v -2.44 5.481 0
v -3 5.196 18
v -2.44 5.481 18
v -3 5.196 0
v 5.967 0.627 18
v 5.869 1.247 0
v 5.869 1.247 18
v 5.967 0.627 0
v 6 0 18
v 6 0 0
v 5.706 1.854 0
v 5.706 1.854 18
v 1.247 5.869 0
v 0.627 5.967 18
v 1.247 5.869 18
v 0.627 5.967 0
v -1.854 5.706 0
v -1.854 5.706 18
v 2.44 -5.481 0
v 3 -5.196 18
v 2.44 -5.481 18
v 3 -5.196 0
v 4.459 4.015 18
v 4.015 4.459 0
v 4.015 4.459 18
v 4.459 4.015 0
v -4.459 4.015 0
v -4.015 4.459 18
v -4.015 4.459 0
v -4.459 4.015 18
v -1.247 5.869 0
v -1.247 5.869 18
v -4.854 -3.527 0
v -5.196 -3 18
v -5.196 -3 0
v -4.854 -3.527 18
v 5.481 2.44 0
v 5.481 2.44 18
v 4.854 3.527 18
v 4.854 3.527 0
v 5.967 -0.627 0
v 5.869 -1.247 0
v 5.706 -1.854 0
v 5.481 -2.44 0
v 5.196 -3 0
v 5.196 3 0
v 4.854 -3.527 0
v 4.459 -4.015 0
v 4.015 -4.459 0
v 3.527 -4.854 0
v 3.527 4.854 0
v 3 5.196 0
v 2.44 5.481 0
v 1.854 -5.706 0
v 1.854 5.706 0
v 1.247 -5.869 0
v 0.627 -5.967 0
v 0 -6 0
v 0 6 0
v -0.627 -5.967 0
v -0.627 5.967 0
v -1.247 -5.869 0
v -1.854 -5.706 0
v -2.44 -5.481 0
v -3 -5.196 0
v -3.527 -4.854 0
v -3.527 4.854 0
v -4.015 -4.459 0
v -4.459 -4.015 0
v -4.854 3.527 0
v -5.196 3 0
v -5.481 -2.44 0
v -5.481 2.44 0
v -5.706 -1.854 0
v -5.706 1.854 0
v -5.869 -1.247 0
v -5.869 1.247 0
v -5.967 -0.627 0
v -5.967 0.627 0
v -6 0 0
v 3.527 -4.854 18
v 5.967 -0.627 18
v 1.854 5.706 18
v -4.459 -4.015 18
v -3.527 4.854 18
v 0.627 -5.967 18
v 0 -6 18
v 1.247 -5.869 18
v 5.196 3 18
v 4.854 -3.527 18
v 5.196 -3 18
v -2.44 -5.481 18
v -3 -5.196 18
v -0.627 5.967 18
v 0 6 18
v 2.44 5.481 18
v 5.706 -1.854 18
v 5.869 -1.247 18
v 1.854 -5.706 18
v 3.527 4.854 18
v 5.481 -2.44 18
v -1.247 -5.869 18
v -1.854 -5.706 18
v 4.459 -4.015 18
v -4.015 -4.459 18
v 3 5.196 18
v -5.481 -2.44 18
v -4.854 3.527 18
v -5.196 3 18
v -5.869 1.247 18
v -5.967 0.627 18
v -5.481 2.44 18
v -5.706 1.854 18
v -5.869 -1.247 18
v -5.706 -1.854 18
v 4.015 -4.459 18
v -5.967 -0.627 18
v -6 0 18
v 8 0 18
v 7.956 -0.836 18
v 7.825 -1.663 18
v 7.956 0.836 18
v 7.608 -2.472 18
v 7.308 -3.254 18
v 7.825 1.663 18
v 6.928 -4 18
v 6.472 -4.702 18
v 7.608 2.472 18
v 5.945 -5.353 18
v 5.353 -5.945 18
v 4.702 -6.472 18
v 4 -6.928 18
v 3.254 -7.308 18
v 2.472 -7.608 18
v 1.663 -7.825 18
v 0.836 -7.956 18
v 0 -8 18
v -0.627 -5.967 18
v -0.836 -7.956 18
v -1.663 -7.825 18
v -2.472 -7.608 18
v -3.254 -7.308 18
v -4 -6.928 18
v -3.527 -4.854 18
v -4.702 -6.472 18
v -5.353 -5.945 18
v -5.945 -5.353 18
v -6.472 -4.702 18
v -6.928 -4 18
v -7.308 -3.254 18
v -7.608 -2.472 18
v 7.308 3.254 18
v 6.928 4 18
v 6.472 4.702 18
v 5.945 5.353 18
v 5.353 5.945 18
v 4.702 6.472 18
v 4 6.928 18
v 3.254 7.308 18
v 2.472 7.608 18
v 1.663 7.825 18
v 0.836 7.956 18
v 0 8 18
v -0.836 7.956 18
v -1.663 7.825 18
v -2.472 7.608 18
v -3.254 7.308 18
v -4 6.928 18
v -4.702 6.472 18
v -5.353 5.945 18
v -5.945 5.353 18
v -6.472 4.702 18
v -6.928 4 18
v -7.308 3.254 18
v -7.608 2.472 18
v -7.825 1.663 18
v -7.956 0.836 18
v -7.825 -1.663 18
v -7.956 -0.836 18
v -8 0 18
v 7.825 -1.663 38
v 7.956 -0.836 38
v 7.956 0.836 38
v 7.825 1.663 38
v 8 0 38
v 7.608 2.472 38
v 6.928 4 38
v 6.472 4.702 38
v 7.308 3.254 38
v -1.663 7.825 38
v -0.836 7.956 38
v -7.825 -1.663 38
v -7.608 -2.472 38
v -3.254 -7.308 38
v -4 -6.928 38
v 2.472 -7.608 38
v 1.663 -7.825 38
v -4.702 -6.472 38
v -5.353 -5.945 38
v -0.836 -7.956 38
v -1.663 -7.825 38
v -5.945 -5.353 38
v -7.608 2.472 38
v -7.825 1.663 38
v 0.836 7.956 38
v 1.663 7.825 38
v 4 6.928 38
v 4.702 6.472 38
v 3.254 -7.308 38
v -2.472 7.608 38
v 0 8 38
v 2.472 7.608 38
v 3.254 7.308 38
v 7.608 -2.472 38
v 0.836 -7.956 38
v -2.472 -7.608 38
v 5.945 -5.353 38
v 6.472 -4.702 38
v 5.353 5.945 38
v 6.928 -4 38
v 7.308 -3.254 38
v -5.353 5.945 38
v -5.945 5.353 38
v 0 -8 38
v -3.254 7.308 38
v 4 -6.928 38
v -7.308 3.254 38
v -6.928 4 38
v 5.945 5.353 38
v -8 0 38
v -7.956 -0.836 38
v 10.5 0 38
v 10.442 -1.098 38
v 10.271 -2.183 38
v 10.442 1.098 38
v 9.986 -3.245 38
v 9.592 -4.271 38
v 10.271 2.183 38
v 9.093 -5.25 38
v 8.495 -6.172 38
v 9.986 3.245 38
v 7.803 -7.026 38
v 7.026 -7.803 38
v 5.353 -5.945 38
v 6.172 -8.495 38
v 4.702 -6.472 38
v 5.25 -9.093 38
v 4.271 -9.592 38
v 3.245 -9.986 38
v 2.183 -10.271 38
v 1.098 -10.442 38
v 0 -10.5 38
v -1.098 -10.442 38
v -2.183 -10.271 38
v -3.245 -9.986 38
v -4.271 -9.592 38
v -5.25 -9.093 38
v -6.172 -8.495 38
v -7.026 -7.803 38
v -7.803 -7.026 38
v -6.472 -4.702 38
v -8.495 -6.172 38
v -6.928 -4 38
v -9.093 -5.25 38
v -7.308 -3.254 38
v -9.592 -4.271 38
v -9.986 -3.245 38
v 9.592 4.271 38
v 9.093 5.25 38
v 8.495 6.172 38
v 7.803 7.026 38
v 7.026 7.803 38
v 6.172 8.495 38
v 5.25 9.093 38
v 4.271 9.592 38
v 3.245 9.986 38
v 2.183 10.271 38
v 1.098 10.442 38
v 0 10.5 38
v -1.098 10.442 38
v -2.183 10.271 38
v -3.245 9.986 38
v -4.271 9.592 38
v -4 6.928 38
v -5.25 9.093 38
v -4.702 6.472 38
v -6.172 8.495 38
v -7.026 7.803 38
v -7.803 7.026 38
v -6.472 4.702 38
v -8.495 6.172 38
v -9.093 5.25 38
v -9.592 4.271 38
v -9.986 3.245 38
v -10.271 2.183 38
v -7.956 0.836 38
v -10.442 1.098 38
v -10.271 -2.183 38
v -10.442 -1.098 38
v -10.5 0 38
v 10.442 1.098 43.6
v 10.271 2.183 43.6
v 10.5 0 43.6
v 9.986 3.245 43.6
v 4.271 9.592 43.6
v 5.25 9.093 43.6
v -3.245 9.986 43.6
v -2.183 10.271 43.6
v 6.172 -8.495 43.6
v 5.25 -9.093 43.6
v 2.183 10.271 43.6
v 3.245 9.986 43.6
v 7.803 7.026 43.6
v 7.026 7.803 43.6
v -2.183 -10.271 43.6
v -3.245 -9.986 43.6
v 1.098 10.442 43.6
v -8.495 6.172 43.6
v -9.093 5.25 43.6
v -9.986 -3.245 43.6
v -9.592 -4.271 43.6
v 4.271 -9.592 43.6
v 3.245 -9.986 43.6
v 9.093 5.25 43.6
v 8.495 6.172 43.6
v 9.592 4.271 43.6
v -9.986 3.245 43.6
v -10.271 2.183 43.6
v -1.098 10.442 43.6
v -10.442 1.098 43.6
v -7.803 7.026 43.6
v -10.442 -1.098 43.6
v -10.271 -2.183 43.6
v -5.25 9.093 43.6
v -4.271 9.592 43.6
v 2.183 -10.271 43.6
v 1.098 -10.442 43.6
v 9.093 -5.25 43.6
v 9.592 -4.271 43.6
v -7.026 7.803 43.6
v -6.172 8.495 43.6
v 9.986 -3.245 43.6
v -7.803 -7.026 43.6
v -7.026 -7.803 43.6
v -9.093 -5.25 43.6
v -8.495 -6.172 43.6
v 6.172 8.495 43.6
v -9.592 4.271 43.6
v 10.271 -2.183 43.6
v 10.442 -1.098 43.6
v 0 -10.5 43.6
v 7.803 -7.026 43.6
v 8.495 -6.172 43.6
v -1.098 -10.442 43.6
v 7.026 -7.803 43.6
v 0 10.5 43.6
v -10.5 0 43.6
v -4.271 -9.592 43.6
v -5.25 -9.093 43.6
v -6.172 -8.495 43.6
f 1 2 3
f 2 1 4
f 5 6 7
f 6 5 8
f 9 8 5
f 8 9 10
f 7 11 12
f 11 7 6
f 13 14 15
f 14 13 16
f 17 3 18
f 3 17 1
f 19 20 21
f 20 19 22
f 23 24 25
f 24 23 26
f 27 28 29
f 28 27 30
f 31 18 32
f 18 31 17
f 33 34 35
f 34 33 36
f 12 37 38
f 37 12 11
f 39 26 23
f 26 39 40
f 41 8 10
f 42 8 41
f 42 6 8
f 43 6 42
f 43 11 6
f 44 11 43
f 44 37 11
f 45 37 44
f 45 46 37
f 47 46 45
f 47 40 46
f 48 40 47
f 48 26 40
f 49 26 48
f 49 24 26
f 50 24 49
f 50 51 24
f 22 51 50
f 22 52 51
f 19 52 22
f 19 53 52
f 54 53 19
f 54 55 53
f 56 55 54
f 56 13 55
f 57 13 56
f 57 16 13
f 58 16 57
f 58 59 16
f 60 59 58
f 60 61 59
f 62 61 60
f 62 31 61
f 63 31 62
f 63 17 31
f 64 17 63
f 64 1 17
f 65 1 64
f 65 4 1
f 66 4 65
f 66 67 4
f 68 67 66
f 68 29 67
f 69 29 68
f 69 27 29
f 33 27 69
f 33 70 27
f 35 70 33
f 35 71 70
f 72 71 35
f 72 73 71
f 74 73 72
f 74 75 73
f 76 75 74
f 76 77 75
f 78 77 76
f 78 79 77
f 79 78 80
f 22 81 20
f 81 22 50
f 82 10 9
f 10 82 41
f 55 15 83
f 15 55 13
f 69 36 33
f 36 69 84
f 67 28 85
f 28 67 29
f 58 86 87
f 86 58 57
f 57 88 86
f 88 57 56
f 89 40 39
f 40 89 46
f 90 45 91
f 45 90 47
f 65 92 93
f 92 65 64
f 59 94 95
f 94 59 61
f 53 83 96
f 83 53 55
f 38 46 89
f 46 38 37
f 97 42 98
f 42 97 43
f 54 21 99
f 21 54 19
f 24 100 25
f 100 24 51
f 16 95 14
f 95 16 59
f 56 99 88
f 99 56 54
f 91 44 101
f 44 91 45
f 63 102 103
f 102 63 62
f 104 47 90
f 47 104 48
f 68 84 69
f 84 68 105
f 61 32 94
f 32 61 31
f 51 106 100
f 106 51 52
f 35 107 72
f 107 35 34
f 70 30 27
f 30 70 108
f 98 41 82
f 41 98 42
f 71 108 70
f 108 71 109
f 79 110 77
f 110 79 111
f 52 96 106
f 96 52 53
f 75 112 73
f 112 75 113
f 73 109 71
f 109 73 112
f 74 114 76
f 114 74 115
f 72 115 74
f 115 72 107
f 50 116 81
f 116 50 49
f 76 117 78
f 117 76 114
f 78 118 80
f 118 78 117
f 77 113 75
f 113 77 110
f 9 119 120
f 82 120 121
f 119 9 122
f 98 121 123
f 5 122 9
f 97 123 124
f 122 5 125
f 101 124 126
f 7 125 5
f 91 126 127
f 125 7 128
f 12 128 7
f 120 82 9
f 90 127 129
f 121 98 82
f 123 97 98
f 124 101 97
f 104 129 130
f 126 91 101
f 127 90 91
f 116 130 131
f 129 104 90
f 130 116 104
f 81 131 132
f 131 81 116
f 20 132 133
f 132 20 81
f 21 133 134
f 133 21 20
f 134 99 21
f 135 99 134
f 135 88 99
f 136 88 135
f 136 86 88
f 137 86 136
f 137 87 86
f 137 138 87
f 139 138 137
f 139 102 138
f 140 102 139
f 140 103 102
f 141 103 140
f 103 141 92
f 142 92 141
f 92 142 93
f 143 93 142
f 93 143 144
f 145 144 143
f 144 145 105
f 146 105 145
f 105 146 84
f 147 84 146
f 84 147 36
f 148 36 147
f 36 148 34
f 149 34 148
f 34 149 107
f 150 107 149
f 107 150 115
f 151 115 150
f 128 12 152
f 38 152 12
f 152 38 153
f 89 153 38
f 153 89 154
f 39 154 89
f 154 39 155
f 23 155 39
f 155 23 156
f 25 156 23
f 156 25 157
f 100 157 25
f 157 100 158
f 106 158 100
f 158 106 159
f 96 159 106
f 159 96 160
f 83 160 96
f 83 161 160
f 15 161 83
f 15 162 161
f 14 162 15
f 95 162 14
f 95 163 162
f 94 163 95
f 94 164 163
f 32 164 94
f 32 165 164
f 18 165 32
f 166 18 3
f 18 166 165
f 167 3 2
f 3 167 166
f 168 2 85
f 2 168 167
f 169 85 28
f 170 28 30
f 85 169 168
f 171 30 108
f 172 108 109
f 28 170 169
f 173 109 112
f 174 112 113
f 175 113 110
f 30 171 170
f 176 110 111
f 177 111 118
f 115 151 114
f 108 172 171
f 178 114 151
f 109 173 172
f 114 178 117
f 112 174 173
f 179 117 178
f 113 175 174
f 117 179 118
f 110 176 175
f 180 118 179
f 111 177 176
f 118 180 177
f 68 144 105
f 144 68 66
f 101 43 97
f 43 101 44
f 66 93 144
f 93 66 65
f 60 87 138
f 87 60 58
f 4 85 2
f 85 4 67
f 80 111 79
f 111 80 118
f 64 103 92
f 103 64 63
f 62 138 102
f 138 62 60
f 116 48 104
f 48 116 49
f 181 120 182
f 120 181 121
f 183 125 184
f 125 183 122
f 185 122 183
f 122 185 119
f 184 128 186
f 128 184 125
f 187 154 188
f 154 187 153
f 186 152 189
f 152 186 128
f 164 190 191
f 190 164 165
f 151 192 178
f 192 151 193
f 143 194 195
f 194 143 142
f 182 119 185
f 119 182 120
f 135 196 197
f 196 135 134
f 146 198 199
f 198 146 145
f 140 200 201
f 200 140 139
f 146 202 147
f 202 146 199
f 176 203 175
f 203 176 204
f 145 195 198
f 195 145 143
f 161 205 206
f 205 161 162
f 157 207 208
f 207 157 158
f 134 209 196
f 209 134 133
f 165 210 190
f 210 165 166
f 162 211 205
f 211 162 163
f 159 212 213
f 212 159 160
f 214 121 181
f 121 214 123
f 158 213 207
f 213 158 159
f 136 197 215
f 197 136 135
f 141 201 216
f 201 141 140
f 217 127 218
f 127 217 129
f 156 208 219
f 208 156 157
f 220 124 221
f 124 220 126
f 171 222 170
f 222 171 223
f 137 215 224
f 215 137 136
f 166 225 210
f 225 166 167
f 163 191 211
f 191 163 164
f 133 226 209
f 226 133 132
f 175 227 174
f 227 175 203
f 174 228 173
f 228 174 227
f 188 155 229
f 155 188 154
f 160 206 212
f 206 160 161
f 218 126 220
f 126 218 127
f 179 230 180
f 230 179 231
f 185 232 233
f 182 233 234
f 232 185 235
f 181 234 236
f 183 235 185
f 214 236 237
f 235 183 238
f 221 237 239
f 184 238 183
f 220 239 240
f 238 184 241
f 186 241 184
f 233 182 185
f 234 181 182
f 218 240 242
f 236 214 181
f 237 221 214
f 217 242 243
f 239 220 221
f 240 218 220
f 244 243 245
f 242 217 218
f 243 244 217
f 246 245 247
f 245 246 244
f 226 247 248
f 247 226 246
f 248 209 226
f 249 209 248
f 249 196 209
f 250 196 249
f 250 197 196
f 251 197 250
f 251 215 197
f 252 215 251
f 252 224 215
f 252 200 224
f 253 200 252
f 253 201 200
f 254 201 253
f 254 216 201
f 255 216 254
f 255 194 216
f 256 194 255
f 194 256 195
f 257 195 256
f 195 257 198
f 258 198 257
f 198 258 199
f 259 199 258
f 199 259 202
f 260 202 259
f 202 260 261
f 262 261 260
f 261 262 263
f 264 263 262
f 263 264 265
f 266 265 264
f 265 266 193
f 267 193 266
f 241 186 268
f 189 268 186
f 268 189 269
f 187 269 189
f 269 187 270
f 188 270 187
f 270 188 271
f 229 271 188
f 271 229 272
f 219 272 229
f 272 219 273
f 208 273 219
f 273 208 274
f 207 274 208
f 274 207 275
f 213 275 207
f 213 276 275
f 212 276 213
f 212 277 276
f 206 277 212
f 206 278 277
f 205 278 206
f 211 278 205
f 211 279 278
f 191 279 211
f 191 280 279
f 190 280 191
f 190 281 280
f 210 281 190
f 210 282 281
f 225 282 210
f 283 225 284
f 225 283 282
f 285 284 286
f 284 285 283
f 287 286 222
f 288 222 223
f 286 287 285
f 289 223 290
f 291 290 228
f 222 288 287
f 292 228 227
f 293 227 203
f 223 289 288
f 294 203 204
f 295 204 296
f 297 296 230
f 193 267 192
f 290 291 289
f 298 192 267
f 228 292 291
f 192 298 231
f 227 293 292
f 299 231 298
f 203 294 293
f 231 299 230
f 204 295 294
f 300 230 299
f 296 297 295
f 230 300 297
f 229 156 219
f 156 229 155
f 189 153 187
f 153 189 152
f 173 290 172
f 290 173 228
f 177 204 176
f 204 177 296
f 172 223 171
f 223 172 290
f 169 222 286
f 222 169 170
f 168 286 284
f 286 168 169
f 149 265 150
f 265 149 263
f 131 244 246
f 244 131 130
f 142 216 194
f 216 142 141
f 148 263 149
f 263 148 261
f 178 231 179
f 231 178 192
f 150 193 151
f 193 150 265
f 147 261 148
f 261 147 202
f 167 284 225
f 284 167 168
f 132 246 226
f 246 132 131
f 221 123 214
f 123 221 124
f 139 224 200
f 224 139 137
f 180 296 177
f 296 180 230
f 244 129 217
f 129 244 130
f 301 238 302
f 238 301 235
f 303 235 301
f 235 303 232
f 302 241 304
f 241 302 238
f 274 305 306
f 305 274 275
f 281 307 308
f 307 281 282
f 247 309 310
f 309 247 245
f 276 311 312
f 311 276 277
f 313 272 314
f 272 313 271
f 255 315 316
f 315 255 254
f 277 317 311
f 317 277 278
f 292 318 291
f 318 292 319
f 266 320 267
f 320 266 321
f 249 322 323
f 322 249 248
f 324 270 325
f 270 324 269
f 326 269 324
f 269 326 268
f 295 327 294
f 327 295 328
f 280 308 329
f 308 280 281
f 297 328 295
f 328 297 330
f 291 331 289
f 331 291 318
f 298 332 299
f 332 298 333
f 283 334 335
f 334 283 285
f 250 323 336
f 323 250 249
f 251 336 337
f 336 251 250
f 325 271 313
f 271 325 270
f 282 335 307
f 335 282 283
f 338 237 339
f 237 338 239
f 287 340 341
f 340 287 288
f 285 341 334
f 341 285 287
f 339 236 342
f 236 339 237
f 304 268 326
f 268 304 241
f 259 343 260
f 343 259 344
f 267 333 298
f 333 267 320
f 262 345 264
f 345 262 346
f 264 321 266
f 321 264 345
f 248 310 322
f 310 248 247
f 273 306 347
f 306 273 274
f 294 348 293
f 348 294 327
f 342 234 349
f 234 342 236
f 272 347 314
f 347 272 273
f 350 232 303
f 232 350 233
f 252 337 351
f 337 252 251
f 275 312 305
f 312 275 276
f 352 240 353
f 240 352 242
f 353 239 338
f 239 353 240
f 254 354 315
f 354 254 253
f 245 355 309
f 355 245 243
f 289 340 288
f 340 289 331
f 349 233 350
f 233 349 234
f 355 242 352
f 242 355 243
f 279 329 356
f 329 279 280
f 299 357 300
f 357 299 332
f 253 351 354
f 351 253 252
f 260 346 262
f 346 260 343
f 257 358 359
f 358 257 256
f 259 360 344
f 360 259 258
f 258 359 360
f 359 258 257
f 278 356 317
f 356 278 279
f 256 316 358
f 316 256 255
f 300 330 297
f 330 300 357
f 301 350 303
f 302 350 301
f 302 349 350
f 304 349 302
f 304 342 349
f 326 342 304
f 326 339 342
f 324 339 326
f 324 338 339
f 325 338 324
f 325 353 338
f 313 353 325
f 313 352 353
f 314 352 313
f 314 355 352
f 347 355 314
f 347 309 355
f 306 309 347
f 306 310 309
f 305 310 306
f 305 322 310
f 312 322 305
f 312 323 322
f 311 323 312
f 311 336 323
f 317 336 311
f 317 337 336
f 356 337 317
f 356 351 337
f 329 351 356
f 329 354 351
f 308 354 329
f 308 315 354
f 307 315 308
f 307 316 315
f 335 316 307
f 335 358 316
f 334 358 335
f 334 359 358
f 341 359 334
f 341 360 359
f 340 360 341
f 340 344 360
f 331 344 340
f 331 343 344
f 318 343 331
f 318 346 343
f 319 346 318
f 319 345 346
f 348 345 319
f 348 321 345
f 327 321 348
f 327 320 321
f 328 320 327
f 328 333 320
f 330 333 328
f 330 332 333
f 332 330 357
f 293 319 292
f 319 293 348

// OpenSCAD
// Shoulder bolt.
$fn = 60;
eps = 0.02;
thread_d = 12;
shoulder_d = 16;
shoulder_l = 20;
thread_l = 18;
head_d = shoulder_d + 5;
union() {
    cylinder(d=thread_d,h=thread_l);
    translate([0,0,thread_l]) cylinder(d=shoulder_d,h=shoulder_l);
    translate([0,0,thread_l+shoulder_l]) cylinder(d=head_d,h=shoulder_d*0.35);
}
